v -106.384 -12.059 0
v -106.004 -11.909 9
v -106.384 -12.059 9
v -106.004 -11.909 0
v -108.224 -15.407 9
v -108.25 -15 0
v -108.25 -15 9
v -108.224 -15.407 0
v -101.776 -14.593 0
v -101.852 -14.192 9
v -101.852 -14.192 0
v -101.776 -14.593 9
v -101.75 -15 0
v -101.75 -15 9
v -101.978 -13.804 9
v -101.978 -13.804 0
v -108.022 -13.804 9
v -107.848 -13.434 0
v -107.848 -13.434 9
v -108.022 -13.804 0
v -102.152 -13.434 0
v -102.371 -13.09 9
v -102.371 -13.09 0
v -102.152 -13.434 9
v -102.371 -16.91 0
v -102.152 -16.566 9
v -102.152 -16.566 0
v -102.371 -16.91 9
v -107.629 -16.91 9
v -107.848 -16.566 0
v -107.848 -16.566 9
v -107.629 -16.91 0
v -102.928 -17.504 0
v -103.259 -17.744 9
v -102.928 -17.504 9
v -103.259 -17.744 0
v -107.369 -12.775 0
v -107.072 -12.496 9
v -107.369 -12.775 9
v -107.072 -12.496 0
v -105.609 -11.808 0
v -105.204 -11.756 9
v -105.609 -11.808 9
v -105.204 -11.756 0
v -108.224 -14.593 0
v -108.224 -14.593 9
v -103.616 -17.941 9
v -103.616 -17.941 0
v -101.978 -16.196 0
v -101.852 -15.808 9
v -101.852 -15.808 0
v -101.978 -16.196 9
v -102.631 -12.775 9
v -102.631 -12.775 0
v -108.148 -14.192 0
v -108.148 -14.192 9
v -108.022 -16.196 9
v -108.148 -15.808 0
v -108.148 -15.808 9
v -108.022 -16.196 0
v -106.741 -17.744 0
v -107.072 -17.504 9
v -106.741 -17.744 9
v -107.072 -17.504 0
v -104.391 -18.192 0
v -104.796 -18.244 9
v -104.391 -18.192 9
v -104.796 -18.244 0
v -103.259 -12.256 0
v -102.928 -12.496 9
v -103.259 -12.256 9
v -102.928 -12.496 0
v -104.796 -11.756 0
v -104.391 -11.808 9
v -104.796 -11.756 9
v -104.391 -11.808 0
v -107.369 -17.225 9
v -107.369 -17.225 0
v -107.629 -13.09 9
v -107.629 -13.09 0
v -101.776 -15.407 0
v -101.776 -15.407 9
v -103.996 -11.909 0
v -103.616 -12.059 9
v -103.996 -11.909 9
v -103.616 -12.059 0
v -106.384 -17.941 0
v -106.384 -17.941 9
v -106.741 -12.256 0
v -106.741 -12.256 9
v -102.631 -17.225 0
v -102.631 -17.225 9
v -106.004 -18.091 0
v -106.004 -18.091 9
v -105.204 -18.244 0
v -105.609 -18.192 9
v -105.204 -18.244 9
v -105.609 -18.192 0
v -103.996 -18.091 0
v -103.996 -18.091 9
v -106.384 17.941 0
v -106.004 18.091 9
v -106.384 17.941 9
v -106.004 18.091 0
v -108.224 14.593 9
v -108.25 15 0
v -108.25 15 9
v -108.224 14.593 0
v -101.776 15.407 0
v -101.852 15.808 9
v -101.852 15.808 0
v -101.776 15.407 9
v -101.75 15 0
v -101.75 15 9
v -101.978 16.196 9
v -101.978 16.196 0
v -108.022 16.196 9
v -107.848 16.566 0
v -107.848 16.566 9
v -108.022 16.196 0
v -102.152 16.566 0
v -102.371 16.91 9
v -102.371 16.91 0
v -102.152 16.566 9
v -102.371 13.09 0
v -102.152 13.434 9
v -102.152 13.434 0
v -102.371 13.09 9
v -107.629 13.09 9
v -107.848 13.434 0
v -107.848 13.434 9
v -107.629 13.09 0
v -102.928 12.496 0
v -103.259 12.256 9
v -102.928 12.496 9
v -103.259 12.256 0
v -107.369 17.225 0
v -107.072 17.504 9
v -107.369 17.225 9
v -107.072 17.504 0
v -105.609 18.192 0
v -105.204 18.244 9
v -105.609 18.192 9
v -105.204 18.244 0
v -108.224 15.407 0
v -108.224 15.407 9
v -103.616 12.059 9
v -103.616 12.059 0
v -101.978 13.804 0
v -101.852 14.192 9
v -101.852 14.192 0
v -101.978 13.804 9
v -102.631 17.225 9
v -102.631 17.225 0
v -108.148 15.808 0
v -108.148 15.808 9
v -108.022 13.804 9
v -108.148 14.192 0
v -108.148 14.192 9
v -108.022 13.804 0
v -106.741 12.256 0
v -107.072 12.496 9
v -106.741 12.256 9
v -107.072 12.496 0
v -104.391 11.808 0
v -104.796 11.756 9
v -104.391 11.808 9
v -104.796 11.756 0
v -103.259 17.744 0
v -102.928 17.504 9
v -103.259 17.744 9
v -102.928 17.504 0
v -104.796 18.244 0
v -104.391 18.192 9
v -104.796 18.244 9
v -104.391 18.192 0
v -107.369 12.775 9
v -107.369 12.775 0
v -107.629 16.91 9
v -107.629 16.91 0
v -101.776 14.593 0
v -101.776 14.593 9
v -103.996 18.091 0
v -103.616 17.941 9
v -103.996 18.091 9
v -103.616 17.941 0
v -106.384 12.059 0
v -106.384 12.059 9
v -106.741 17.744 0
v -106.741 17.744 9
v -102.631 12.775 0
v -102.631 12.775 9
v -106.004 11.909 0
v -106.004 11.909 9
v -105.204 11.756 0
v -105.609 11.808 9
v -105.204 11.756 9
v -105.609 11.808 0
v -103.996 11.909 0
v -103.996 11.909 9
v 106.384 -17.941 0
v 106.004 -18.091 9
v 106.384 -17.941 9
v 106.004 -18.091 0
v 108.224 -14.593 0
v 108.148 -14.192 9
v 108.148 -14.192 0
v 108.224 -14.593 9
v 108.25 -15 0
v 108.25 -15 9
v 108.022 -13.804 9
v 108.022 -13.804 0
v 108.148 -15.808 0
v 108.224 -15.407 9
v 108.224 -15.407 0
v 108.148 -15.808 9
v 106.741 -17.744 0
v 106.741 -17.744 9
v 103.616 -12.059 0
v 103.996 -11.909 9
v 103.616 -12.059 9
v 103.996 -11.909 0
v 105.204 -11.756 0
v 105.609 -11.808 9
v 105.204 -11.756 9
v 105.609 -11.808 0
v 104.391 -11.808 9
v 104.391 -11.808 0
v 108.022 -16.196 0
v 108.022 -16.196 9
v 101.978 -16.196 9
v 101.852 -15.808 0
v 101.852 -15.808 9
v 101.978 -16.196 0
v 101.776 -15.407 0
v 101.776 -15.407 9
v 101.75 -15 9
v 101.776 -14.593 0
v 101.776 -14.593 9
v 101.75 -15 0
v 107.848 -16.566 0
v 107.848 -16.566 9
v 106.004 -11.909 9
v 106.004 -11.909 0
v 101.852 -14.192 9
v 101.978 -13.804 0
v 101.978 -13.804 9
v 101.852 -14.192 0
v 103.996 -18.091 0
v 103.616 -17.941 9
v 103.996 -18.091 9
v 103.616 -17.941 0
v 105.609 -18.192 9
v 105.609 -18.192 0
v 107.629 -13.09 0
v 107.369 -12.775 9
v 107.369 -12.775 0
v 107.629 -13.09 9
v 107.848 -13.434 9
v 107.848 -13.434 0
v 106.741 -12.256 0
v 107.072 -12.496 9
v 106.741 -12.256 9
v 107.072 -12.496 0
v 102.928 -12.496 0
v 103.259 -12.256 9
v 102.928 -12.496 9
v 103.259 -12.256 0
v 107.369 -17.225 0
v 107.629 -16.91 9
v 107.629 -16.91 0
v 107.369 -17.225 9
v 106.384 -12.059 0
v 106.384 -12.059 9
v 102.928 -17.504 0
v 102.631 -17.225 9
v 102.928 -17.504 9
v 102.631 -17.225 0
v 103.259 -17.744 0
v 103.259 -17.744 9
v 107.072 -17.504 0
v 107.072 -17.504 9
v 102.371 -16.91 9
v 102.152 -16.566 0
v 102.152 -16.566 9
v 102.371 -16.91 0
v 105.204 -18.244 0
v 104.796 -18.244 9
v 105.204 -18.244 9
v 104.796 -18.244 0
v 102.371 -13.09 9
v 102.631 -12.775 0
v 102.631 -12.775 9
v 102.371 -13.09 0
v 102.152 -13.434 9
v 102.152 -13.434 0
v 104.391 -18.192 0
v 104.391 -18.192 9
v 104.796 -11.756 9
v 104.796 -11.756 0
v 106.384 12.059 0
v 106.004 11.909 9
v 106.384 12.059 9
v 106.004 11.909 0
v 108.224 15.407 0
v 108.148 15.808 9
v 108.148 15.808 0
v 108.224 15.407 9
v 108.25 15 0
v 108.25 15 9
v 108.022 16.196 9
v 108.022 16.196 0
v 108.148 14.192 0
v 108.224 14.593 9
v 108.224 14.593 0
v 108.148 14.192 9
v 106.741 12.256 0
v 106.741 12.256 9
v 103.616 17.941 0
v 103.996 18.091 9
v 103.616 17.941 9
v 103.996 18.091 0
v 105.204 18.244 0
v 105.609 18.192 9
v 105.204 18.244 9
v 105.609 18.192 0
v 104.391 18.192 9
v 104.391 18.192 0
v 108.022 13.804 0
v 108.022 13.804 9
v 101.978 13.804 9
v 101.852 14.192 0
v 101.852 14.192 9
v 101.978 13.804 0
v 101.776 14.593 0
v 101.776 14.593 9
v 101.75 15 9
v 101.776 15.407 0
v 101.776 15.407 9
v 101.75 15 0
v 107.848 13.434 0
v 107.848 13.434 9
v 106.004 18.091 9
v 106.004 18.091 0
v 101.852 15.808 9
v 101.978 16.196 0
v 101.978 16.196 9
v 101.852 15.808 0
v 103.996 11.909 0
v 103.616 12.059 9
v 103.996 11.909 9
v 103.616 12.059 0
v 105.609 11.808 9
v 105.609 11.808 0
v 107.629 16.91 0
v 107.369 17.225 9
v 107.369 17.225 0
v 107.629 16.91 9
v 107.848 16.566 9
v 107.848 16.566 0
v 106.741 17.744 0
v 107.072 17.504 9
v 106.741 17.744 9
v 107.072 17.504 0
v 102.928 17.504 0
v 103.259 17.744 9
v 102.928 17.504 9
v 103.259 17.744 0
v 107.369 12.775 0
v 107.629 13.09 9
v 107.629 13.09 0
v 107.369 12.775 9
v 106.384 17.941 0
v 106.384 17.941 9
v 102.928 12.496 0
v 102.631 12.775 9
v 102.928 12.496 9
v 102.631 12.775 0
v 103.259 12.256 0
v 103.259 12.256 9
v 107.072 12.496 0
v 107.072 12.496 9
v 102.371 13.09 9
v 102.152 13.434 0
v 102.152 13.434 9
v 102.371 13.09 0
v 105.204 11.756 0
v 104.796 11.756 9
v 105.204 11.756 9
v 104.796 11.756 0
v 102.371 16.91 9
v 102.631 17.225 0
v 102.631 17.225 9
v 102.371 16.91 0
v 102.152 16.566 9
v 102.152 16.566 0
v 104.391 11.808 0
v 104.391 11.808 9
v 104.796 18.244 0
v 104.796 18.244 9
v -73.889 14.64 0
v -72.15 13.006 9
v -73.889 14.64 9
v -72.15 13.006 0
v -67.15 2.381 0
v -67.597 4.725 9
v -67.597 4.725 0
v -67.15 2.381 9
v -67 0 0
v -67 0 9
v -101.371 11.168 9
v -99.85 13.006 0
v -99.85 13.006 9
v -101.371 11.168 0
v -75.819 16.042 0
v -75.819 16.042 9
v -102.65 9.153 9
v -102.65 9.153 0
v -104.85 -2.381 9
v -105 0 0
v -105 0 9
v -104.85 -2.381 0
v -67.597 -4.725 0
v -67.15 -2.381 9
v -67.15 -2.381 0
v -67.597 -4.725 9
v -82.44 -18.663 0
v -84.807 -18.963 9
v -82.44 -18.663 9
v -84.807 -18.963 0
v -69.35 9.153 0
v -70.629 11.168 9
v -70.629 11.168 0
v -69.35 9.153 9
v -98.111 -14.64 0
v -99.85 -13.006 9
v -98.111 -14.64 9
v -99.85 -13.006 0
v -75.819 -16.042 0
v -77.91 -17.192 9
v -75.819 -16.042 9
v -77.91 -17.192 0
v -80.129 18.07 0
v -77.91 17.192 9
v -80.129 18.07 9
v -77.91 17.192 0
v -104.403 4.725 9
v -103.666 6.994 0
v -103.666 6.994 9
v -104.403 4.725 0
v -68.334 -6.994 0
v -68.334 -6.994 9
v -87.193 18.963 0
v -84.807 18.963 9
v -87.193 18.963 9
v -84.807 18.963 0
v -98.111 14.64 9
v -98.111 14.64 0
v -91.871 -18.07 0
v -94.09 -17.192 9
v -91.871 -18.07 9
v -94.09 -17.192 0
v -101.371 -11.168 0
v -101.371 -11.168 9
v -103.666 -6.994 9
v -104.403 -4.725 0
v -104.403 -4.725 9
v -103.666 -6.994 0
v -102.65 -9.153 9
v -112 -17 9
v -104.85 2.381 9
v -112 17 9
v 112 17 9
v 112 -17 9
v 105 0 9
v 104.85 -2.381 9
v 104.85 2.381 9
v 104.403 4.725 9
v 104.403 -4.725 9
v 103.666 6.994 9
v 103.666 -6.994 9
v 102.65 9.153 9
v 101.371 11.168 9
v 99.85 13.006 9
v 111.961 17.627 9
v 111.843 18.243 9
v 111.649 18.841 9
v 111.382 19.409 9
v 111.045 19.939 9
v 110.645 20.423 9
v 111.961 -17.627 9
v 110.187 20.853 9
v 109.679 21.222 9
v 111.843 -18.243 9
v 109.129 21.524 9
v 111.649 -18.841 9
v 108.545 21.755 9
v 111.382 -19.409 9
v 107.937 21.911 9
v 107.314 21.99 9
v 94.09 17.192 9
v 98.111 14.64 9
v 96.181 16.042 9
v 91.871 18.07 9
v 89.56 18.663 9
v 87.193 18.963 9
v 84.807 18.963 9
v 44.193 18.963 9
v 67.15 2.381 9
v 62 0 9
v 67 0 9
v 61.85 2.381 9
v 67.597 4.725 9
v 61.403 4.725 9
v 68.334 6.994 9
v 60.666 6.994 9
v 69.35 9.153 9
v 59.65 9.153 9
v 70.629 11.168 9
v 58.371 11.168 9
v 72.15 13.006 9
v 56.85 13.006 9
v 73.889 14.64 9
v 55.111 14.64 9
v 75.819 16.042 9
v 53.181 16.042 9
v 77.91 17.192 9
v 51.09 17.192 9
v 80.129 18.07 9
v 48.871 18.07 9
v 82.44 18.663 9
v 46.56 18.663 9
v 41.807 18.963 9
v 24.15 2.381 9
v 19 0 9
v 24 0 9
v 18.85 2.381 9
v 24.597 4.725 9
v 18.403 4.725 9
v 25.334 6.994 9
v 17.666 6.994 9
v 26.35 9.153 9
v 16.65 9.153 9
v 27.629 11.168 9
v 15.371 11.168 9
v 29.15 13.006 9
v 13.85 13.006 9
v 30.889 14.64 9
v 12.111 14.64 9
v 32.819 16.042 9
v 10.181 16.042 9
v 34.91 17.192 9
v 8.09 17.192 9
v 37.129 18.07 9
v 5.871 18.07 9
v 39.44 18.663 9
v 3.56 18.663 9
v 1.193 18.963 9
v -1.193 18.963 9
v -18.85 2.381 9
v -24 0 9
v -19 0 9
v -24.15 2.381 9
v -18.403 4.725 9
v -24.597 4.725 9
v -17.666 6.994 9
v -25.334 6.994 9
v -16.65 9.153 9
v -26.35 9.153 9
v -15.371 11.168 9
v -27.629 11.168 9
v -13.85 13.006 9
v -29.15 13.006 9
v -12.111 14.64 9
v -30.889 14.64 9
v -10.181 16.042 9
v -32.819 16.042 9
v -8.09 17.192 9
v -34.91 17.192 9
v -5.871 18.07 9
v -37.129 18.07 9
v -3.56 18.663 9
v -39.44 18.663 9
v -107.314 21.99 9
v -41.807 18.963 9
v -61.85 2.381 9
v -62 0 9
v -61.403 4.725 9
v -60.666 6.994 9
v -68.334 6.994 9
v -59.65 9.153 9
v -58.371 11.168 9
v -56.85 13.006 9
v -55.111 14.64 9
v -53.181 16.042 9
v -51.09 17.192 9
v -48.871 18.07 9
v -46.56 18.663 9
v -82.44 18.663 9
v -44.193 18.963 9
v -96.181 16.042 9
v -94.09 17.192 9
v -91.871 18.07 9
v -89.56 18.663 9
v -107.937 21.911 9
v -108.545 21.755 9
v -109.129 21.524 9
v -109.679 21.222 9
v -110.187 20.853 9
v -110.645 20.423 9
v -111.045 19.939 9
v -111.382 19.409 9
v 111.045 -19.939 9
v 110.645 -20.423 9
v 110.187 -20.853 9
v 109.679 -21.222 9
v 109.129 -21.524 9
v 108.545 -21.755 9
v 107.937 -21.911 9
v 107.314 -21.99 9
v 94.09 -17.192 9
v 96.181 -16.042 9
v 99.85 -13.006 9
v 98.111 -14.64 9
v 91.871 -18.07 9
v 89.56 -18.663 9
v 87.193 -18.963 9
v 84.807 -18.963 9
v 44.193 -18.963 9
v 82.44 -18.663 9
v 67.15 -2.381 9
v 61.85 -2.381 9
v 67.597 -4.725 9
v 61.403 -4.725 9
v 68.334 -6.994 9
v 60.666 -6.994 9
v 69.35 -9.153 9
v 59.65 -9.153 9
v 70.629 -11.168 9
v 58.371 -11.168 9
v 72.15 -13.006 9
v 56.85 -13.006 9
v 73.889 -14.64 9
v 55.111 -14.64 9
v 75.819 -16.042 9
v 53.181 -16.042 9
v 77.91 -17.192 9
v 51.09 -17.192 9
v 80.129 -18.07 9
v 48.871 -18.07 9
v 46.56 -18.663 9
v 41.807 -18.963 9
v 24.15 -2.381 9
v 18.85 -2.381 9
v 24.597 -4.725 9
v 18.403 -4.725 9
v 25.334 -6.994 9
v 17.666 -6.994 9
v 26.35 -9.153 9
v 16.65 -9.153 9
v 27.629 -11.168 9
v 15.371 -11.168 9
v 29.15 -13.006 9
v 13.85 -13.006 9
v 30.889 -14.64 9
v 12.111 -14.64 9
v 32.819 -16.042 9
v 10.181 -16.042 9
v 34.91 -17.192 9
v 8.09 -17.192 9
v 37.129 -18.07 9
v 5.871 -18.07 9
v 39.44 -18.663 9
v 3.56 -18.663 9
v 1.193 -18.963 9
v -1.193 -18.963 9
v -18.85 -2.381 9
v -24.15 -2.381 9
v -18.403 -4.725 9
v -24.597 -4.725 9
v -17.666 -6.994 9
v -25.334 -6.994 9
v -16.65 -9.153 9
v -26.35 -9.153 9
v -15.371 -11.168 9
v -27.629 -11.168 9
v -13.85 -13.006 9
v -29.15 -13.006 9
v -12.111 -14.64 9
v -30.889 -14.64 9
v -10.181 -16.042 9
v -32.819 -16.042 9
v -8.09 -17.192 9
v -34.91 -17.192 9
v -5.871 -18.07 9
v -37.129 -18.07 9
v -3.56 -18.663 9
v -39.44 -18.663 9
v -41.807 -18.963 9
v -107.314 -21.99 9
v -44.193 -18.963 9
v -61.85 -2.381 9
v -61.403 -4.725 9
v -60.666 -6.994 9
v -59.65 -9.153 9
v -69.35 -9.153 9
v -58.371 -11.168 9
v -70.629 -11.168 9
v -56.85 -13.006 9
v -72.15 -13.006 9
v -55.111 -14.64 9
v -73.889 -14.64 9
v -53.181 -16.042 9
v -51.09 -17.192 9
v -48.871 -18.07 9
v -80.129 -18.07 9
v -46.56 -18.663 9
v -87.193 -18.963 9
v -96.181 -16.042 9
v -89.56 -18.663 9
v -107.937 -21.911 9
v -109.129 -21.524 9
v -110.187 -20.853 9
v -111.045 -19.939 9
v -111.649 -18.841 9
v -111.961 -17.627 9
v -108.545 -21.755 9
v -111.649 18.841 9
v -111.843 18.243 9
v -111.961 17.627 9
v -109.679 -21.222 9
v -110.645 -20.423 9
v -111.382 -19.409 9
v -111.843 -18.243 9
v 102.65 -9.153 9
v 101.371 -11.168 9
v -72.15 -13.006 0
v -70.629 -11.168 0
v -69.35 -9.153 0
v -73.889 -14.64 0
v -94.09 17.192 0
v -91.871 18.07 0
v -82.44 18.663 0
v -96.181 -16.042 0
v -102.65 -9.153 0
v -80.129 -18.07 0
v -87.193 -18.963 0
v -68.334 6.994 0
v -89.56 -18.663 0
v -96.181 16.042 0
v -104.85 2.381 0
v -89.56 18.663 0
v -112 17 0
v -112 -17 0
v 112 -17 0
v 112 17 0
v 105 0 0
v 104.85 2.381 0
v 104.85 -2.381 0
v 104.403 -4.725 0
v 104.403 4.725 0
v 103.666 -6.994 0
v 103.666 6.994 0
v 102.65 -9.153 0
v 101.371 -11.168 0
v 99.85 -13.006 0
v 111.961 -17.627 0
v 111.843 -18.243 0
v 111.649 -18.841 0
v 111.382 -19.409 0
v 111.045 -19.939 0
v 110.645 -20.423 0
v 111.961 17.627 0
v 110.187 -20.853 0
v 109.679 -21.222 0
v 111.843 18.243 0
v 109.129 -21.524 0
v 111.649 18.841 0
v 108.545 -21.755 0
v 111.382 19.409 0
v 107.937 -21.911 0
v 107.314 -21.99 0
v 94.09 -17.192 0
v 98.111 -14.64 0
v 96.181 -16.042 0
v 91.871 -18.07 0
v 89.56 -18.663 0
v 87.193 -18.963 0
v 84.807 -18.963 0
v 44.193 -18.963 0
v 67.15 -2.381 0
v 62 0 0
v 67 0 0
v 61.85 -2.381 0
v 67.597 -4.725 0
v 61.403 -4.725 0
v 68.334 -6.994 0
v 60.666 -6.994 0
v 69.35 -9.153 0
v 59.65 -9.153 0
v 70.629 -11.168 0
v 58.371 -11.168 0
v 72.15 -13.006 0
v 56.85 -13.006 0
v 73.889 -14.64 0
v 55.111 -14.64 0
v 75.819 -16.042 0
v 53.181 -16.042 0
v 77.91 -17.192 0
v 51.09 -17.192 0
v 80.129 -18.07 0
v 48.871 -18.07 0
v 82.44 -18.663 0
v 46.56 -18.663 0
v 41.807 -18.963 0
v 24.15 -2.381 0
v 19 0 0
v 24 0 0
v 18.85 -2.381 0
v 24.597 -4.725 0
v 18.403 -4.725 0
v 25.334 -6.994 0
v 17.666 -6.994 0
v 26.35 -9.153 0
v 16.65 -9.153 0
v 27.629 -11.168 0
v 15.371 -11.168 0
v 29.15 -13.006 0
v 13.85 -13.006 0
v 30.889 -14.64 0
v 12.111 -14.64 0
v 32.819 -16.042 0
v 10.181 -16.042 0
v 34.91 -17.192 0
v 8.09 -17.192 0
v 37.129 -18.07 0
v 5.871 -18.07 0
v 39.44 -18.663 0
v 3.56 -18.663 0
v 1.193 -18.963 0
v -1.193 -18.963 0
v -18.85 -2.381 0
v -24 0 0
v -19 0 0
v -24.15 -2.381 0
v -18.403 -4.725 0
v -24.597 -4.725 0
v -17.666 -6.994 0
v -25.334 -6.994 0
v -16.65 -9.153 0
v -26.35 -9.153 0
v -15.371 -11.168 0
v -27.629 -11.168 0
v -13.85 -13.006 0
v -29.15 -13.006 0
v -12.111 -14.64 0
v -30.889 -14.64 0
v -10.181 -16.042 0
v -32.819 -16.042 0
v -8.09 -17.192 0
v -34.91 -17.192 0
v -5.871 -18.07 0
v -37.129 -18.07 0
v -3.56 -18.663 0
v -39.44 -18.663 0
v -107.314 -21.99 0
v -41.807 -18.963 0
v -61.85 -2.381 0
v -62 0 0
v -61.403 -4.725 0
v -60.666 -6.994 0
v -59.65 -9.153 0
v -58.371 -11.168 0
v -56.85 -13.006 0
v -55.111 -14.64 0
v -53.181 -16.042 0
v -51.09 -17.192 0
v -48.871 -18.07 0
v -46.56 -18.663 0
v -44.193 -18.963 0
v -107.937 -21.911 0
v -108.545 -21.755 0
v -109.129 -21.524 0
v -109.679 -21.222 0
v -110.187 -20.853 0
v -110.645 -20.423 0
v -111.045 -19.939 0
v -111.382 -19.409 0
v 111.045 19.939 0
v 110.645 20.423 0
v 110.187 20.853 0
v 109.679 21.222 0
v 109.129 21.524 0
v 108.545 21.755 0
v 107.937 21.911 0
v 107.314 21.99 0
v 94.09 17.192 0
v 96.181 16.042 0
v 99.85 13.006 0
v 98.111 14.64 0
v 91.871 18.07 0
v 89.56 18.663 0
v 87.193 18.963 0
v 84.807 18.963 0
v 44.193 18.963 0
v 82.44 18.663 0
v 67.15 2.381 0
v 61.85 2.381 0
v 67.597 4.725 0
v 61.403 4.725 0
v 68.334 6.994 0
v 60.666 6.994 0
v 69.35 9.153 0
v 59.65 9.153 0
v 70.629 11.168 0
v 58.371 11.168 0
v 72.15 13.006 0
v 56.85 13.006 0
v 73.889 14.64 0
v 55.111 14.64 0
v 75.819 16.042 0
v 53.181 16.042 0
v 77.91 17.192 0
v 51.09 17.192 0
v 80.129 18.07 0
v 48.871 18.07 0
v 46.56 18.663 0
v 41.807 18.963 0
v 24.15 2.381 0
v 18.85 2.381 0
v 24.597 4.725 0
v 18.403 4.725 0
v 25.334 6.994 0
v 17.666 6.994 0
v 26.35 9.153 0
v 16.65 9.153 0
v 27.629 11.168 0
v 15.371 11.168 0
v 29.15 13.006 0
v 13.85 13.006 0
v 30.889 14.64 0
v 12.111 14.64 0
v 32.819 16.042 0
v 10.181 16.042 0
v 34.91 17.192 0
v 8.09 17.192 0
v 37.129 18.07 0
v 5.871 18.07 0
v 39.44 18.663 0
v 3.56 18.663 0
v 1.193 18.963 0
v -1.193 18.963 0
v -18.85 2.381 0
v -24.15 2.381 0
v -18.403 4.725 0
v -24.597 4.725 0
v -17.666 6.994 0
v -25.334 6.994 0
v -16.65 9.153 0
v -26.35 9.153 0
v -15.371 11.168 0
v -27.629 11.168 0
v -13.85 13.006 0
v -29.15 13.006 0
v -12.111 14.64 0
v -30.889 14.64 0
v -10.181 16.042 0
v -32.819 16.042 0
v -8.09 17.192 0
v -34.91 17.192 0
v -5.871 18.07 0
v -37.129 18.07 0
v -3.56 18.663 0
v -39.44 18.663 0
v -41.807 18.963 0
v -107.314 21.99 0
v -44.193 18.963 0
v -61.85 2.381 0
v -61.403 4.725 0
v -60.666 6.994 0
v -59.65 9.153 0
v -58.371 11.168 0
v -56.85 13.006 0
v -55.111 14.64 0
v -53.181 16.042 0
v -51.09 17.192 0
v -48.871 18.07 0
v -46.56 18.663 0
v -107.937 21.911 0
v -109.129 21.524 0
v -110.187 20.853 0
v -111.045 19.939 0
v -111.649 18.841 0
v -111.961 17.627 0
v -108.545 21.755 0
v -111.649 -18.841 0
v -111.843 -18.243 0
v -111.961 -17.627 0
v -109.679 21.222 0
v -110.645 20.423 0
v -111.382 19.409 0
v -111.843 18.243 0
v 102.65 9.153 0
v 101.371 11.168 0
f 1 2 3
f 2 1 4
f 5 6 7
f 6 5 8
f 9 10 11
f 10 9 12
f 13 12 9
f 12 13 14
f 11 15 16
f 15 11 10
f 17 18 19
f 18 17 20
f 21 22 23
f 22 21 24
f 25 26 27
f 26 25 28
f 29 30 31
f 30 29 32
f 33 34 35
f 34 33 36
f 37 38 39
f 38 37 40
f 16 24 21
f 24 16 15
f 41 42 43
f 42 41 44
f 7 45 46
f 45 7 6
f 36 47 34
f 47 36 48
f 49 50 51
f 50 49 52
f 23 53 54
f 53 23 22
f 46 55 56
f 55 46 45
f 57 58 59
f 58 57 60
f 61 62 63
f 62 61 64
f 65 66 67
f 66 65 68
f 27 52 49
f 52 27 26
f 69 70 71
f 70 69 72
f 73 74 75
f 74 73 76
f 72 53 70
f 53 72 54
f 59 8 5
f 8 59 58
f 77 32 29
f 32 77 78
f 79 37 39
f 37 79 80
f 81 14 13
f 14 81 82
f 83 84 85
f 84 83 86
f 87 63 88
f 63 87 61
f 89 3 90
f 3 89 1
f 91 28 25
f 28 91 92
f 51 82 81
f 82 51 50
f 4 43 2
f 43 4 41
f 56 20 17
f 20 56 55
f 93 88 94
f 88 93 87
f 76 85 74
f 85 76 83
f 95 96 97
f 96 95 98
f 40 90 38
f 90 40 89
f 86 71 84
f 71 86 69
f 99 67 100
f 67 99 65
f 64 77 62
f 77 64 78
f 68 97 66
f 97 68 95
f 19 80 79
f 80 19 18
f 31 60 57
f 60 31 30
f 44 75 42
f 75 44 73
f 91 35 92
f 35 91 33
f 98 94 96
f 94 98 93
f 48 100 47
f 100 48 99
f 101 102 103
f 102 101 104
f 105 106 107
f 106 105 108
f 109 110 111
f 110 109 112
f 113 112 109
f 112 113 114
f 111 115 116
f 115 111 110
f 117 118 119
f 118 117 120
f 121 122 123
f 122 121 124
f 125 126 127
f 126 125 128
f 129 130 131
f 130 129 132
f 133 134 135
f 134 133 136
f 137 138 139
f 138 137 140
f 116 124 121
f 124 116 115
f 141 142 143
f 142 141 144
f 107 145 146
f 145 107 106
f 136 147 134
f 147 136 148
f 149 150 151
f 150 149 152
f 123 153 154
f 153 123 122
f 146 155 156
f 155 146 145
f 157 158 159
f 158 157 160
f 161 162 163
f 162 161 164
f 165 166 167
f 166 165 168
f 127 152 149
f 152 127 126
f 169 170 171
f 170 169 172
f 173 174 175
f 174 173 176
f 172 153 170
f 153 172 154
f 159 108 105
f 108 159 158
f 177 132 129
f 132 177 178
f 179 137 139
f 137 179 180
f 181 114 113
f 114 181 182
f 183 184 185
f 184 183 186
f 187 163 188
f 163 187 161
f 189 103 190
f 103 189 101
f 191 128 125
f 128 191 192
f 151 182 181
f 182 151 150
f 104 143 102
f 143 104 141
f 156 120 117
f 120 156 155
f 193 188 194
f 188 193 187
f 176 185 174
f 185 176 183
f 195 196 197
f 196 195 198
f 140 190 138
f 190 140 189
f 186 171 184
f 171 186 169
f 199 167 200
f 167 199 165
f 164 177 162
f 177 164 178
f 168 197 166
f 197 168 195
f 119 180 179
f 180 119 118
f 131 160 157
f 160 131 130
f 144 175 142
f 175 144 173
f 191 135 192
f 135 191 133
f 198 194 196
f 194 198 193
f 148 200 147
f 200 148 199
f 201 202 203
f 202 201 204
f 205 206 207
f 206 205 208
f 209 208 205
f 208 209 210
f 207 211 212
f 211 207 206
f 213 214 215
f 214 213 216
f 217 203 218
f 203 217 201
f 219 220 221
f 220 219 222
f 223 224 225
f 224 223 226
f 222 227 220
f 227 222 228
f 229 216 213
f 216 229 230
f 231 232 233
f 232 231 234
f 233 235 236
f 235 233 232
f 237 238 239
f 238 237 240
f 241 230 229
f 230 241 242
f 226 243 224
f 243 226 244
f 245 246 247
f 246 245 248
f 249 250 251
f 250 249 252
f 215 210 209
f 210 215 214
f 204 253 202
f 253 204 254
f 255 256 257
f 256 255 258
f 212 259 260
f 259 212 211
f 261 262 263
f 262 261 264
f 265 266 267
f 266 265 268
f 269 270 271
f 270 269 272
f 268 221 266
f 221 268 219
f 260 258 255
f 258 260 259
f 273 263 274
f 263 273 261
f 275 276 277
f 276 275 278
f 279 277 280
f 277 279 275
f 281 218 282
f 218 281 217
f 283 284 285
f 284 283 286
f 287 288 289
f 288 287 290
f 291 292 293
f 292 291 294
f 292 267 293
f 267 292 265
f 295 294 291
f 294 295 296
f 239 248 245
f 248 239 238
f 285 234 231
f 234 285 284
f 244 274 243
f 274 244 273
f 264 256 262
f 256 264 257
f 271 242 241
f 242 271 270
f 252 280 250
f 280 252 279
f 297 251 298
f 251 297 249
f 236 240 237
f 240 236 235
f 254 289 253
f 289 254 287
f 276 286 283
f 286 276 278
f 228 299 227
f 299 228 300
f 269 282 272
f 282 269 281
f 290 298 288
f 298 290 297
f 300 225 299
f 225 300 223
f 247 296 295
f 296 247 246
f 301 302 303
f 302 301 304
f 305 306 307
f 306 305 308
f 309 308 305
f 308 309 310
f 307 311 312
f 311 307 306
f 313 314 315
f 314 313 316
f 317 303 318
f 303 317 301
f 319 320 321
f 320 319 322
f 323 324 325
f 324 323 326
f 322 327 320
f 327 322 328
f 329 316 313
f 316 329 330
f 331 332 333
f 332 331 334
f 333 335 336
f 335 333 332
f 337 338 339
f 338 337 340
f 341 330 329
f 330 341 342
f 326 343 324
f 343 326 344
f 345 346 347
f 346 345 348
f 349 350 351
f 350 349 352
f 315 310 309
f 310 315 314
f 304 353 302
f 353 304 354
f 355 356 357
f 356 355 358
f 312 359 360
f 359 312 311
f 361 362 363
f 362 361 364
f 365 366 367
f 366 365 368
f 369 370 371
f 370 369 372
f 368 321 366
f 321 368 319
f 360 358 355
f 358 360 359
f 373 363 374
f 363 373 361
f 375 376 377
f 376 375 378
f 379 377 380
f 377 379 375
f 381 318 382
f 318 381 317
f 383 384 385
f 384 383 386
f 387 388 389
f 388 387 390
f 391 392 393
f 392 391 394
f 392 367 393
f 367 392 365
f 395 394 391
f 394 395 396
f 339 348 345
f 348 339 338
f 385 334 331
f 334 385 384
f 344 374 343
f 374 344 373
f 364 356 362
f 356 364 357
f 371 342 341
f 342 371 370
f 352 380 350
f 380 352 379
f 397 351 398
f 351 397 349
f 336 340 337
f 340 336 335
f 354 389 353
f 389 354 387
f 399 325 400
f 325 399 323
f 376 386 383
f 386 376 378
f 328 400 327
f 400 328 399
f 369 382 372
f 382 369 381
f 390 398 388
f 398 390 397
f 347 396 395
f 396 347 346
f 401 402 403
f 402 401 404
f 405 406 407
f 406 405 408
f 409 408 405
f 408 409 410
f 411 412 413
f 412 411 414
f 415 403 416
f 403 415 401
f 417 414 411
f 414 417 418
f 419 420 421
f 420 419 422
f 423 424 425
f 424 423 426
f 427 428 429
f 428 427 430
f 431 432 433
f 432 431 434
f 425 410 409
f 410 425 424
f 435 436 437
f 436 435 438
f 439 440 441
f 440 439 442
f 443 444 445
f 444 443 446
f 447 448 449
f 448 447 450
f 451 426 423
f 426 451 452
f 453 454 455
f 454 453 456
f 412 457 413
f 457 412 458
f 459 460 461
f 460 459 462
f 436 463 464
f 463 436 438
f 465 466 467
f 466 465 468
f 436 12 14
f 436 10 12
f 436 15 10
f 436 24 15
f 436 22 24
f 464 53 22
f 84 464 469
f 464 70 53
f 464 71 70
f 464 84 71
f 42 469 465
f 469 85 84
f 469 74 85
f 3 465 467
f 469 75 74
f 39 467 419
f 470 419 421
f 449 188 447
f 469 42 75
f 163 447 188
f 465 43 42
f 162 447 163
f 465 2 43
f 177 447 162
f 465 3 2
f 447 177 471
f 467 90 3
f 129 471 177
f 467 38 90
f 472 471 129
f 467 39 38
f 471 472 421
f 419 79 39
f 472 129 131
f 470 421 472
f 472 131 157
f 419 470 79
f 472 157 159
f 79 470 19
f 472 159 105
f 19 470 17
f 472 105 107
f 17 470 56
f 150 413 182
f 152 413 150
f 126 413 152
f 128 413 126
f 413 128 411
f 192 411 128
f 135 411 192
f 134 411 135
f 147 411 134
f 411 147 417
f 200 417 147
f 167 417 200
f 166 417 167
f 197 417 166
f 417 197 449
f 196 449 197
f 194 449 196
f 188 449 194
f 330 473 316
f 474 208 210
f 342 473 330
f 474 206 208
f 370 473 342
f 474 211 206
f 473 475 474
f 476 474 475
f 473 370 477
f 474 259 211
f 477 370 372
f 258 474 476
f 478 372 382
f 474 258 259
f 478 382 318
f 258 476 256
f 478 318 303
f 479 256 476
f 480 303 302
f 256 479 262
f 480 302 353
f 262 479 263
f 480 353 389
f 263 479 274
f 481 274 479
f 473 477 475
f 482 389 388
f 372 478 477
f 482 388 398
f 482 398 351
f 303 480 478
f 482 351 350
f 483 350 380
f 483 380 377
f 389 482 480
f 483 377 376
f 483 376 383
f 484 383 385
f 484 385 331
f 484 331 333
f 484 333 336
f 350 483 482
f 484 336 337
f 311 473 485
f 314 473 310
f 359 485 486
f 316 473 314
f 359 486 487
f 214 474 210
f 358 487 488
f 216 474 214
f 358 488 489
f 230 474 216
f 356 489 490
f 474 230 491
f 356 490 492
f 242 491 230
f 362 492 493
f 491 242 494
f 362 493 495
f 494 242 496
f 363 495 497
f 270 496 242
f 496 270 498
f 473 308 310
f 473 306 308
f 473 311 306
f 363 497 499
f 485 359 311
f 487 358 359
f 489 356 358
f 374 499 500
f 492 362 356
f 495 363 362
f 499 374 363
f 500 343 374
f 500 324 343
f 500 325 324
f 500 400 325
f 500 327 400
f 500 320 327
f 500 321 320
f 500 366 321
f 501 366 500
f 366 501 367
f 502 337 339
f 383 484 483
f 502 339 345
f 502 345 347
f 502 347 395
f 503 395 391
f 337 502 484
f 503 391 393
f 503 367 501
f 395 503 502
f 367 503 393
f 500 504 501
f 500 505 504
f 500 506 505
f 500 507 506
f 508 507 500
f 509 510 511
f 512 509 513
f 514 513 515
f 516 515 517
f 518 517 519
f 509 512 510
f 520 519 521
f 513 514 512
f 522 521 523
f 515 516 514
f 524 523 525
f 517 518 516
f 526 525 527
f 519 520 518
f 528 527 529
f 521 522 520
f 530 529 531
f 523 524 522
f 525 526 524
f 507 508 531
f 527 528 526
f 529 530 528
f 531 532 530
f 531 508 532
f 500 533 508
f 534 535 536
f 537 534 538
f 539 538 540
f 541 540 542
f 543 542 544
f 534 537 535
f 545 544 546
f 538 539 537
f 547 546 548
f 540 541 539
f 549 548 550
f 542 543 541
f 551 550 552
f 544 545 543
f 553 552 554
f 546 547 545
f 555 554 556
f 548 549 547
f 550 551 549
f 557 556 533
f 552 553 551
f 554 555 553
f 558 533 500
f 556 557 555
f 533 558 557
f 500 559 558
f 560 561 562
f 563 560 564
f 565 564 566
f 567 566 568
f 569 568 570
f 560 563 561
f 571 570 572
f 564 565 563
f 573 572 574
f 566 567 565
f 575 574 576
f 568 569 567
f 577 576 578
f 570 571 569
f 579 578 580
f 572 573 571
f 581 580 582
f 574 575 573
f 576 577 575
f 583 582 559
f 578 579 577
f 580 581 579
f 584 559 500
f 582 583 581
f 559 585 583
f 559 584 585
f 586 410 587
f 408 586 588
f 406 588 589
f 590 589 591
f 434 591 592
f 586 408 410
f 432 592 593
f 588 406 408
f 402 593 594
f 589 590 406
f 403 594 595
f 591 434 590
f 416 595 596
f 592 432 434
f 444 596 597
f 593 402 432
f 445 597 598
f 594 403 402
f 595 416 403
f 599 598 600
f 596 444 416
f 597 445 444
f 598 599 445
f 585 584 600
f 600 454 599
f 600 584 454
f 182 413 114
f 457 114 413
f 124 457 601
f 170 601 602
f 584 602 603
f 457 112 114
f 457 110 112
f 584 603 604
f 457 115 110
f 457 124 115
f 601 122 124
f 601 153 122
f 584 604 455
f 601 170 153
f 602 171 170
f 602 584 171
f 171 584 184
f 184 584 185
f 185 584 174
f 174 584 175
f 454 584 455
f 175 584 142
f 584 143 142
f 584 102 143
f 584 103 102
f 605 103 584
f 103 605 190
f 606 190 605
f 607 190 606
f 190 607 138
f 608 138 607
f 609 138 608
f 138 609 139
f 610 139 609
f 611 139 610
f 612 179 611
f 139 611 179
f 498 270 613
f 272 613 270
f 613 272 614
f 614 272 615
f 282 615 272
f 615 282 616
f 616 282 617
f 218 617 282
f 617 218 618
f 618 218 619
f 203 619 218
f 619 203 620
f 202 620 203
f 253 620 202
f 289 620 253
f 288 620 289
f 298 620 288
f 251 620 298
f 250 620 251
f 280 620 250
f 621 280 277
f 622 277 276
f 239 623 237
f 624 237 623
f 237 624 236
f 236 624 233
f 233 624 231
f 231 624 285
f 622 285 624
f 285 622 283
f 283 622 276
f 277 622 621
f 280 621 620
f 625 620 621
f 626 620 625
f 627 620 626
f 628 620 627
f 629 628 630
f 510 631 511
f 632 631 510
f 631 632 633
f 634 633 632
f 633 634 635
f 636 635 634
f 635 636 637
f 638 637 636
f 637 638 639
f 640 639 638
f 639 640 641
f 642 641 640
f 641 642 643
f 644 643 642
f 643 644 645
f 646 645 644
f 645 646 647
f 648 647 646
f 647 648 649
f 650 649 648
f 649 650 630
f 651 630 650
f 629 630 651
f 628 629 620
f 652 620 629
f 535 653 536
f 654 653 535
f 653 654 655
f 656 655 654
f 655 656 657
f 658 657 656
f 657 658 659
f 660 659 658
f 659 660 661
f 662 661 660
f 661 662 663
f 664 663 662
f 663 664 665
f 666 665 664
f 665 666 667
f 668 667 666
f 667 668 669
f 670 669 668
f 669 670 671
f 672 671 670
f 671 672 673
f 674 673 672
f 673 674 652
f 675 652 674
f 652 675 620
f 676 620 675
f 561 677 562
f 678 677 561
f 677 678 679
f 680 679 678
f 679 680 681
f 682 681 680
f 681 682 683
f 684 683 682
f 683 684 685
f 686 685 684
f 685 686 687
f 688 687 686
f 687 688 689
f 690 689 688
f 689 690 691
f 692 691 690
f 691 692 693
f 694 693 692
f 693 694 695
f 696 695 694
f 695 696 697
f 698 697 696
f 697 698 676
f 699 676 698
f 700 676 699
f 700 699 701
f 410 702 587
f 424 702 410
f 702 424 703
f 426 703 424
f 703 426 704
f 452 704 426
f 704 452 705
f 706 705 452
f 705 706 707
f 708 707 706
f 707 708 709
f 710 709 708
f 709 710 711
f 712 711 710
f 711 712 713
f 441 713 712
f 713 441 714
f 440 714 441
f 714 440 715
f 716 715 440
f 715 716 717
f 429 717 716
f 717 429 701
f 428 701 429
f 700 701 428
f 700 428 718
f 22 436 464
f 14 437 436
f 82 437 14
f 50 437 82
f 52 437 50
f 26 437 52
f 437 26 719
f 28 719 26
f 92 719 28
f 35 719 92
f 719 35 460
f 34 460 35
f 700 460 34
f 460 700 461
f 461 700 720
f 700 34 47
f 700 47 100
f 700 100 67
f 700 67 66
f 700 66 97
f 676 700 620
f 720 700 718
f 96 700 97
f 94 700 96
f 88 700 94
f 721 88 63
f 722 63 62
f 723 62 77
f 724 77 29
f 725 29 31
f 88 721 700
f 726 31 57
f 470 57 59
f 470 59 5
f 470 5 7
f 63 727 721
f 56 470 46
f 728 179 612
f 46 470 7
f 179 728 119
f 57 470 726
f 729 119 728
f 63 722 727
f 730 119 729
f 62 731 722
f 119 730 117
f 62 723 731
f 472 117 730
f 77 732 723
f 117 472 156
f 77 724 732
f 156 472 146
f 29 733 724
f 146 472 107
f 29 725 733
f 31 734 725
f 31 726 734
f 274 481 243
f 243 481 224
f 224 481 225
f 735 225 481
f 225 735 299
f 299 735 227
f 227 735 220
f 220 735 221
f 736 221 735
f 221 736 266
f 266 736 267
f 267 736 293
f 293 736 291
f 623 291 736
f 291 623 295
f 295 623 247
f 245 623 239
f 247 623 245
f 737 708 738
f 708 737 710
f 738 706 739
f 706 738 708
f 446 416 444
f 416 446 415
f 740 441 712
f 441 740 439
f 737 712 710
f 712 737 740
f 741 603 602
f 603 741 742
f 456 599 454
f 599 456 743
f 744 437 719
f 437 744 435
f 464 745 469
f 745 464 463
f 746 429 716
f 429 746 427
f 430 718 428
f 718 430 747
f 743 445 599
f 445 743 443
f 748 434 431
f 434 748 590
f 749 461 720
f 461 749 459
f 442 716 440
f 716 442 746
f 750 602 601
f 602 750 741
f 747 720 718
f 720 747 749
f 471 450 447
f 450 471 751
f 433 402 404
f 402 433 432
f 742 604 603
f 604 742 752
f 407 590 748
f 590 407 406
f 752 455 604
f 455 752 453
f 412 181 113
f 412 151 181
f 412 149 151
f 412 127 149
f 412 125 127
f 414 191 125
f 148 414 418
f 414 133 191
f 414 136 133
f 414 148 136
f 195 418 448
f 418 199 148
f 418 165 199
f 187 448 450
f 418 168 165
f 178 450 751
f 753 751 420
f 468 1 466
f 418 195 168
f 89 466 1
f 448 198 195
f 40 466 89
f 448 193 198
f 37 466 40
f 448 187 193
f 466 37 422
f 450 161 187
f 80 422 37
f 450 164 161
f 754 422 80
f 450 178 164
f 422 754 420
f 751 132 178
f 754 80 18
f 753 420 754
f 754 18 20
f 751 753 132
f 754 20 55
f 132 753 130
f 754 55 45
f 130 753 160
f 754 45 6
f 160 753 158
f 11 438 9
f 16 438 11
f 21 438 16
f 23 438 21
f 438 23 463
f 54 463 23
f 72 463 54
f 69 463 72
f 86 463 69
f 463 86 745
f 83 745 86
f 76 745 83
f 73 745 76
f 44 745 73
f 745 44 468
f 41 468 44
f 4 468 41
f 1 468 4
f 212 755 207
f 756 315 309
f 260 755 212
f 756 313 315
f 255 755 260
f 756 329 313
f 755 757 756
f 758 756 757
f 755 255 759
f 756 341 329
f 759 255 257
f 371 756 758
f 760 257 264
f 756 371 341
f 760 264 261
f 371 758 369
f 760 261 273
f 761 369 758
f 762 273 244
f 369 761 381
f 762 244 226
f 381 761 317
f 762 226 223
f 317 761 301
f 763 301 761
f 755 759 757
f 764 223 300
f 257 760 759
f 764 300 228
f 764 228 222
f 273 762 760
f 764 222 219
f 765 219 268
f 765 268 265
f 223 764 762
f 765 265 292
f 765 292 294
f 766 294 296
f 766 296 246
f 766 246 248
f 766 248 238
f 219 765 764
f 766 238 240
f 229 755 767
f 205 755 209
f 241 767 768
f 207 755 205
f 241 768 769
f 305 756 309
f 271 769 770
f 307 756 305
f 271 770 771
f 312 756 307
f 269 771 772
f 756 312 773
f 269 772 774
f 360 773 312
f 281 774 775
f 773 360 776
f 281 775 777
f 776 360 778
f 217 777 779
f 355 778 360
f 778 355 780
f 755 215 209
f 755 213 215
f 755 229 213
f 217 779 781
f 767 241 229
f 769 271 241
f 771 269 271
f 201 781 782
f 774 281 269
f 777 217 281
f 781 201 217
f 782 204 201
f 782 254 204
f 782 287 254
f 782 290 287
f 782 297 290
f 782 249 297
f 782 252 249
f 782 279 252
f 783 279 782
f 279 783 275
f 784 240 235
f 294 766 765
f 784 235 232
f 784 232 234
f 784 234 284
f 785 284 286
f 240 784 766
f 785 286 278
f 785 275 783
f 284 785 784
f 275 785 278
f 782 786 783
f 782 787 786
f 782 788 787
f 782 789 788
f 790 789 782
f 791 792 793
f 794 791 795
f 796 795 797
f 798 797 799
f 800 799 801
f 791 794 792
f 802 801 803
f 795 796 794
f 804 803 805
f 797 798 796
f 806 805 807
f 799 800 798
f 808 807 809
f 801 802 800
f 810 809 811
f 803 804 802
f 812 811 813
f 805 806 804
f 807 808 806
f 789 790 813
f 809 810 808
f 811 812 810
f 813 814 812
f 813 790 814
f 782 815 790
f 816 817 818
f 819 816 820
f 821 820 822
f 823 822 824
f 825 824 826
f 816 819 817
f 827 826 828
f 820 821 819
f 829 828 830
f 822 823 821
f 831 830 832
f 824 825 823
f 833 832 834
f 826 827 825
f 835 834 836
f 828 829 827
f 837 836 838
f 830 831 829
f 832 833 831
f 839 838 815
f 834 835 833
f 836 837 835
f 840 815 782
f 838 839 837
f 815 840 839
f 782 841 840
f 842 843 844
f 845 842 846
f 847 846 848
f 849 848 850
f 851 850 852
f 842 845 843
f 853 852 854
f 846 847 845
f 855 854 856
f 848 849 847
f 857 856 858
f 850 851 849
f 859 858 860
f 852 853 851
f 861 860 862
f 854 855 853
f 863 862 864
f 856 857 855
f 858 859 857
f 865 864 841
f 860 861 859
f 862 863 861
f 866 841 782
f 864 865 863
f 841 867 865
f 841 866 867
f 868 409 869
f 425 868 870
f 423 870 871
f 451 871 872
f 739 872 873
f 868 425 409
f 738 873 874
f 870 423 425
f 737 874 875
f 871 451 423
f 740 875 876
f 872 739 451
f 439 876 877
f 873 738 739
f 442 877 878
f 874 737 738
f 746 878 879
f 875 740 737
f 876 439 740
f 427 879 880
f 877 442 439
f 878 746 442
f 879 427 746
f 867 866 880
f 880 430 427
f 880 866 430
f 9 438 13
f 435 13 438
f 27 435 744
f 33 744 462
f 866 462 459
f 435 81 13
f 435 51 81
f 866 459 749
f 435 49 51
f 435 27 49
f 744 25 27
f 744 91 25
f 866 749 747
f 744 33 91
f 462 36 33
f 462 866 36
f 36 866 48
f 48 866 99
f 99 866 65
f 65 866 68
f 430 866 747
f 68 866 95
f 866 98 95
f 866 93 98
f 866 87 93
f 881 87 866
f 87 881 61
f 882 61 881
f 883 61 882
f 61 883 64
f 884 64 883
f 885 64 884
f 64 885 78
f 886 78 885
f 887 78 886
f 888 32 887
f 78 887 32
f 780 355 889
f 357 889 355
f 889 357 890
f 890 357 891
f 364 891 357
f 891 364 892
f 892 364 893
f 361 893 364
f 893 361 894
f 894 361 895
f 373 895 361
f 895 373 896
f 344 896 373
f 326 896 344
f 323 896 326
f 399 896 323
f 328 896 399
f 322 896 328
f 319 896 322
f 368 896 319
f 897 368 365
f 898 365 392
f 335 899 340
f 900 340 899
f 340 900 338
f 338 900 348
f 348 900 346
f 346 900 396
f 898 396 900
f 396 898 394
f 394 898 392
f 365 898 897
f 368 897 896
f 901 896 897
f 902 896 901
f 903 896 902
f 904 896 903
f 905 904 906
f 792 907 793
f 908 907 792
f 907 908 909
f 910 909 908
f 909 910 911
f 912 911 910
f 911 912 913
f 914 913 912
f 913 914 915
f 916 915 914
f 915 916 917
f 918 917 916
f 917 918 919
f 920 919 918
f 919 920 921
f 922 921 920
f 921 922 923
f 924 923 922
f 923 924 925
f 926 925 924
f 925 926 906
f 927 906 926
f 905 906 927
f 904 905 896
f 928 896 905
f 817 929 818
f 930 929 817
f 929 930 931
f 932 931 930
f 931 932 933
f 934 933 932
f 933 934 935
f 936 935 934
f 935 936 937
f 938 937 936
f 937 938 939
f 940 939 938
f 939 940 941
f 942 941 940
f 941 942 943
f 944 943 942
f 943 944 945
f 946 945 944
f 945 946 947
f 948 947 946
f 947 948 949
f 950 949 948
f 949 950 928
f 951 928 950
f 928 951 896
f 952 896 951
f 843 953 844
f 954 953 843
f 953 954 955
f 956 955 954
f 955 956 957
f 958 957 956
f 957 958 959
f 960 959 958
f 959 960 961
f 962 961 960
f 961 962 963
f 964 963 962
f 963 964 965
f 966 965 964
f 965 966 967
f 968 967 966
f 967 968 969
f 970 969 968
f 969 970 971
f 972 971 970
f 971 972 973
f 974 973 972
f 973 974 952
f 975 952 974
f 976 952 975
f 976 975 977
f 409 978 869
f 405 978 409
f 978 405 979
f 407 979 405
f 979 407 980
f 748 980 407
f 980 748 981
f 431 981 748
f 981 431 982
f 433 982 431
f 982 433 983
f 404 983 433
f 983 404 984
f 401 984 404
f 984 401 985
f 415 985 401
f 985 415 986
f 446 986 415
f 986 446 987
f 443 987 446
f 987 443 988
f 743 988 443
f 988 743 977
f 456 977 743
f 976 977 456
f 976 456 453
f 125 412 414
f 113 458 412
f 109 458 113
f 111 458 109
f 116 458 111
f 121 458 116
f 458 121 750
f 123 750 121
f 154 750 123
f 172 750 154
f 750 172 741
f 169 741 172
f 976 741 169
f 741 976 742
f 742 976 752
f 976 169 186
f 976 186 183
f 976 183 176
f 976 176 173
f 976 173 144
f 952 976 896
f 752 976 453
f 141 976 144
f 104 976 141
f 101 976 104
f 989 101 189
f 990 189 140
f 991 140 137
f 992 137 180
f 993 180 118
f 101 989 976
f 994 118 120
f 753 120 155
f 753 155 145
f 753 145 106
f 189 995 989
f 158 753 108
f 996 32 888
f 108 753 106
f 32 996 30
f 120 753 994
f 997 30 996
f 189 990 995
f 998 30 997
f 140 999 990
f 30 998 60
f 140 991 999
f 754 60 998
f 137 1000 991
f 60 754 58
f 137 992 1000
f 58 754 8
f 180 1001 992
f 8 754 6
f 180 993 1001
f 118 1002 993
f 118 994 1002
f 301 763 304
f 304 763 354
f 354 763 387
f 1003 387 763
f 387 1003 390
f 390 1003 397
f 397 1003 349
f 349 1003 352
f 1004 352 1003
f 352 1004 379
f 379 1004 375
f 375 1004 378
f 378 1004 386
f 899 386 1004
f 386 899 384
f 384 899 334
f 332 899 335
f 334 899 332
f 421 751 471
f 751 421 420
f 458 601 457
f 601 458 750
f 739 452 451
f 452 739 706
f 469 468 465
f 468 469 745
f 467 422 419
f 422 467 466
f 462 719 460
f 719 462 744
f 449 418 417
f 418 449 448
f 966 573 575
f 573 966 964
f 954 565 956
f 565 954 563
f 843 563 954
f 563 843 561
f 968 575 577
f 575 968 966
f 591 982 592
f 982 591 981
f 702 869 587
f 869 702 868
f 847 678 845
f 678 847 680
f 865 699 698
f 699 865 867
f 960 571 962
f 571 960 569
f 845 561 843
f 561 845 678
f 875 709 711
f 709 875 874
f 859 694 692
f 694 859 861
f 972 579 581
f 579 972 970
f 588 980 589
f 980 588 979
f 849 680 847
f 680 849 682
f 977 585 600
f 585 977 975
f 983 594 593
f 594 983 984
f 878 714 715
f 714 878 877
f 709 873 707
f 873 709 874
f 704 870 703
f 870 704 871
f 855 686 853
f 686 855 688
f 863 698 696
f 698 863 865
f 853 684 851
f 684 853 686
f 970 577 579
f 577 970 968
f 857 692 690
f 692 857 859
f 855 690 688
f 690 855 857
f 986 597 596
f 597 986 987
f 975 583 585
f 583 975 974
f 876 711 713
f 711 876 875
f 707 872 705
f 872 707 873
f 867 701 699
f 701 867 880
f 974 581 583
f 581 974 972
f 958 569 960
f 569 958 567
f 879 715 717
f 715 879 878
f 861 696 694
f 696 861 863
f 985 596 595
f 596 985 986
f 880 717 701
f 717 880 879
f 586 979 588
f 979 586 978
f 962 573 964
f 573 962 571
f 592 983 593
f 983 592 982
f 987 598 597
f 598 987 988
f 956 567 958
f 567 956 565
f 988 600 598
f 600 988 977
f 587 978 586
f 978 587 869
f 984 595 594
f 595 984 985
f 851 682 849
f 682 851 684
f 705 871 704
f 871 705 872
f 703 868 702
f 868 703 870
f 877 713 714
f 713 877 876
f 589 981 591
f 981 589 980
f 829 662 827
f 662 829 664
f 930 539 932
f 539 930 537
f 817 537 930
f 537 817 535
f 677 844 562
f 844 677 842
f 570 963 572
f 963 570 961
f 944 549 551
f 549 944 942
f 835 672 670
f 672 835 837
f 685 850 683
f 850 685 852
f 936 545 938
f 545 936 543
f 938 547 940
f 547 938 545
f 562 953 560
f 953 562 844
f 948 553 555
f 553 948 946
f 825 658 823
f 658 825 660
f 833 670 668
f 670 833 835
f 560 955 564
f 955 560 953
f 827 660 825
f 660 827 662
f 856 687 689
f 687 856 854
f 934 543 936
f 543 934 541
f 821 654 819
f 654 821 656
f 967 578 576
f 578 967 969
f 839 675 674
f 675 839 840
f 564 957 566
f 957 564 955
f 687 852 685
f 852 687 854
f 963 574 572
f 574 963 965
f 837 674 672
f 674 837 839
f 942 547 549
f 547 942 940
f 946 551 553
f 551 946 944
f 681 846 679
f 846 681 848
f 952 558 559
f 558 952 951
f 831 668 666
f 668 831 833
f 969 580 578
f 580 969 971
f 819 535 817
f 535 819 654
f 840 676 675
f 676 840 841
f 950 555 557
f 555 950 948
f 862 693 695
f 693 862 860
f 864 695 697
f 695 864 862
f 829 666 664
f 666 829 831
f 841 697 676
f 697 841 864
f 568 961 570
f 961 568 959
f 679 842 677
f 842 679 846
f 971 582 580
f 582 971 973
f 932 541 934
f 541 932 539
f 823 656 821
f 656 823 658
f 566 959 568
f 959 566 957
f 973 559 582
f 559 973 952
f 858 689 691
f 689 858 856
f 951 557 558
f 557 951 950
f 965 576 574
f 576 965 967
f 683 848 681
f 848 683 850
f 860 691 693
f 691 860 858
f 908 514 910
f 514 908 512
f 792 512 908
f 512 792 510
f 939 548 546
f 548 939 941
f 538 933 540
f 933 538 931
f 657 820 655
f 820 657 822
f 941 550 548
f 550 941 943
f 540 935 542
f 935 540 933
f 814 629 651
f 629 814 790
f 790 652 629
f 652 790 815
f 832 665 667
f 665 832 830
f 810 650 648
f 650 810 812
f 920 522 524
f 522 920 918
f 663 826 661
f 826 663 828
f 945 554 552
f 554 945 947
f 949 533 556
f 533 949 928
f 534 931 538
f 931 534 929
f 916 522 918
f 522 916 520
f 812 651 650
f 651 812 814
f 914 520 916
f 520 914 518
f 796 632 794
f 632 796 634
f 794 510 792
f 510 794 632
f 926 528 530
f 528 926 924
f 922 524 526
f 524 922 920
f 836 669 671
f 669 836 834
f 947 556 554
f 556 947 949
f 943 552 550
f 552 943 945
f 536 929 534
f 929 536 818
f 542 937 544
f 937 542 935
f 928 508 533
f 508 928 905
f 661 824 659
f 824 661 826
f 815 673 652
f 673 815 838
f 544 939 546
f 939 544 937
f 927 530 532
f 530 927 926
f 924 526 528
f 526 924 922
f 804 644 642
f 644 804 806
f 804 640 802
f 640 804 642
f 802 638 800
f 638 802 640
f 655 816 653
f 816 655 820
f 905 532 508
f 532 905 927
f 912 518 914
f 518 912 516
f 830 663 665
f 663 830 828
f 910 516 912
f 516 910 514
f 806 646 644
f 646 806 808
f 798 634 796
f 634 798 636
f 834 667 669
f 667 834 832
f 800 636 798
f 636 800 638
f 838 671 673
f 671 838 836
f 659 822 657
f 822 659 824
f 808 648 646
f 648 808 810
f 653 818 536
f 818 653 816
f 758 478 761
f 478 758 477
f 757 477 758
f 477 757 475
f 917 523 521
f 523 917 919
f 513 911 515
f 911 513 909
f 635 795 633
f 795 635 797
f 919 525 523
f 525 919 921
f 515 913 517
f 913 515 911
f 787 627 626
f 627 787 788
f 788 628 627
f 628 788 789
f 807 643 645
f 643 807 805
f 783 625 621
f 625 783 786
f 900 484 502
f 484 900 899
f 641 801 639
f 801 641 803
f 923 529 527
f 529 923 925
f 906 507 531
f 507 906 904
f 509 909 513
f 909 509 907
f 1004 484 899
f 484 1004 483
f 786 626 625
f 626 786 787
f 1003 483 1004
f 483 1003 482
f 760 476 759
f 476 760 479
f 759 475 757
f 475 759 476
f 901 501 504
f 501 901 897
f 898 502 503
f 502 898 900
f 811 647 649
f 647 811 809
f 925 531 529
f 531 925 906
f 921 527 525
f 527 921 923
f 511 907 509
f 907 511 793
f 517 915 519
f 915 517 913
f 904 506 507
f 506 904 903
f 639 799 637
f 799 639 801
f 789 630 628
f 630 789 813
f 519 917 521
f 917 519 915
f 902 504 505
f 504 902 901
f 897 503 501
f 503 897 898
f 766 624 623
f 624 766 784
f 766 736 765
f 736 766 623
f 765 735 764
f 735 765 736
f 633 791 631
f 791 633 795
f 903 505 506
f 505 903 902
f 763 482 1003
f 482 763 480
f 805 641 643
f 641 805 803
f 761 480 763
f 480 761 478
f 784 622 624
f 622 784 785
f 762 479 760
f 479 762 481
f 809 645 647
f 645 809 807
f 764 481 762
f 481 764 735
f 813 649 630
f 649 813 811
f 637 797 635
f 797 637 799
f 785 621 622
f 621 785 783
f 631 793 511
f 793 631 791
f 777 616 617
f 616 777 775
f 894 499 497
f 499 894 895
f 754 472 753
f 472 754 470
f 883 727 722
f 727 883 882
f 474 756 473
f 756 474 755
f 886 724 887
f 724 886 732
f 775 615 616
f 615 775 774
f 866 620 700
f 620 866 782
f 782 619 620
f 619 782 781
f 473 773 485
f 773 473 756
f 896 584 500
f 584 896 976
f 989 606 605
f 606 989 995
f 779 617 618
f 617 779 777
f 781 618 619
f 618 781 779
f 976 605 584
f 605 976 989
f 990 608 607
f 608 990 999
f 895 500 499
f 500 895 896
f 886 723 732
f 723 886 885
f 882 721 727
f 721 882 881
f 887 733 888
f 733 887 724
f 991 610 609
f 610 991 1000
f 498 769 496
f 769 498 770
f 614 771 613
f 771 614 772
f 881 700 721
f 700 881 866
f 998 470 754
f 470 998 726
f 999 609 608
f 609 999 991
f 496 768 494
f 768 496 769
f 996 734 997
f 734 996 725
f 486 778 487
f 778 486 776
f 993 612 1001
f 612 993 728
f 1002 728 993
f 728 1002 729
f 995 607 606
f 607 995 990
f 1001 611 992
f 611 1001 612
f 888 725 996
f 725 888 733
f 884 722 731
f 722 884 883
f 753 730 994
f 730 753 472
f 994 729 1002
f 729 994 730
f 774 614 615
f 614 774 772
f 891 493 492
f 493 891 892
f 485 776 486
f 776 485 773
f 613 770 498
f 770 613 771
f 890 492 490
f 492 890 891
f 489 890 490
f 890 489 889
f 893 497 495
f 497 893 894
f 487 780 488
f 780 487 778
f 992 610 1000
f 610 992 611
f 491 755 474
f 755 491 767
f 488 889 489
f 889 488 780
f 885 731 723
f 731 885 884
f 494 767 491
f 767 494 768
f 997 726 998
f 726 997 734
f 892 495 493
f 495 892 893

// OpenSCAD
$fn = 50;


difference() {
	union() {
		hull() {
			translate(v = [-107.0000000000, 17.0000000000, 0]) {
				cylinder(h = 9, r = 5);
			}
			translate(v = [107.0000000000, 17.0000000000, 0]) {
				cylinder(h = 9, r = 5);
			}
			translate(v = [-107.0000000000, -17.0000000000, 0]) {
				cylinder(h = 9, r = 5);
			}
			translate(v = [107.0000000000, -17.0000000000, 0]) {
				cylinder(h = 9, r = 5);
			}
		}
	}
	union() {
		#translate(v = [-105.0000000000, -15.0000000000, -100.0000000000]) {
			cylinder(h = 200, r = 3.2500000000);
		}
		#translate(v = [-105.0000000000, 15.0000000000, -100.0000000000]) {
			cylinder(h = 200, r = 3.2500000000);
		}
		#translate(v = [105.0000000000, -15.0000000000, -100.0000000000]) {
			cylinder(h = 200, r = 3.2500000000);
		}
		#translate(v = [105.0000000000, 15.0000000000, -100.0000000000]) {
			cylinder(h = 200, r = 3.2500000000);
		}
		#translate(v = [-86.0000000000, 0, 0]) {
			cylinder(h = 9, r = 19.0000000000);
		}
		#translate(v = [-43.0000000000, 0, 0]) {
			cylinder(h = 9, r = 19.0000000000);
		}
		#cylinder(h = 9, r = 19.0000000000);
		#translate(v = [43.0000000000, 0, 0]) {
			cylinder(h = 9, r = 19.0000000000);
		}
		#translate(v = [86.0000000000, 0, 0]) {
			cylinder(h = 9, r = 19.0000000000);
		}
	}
}
